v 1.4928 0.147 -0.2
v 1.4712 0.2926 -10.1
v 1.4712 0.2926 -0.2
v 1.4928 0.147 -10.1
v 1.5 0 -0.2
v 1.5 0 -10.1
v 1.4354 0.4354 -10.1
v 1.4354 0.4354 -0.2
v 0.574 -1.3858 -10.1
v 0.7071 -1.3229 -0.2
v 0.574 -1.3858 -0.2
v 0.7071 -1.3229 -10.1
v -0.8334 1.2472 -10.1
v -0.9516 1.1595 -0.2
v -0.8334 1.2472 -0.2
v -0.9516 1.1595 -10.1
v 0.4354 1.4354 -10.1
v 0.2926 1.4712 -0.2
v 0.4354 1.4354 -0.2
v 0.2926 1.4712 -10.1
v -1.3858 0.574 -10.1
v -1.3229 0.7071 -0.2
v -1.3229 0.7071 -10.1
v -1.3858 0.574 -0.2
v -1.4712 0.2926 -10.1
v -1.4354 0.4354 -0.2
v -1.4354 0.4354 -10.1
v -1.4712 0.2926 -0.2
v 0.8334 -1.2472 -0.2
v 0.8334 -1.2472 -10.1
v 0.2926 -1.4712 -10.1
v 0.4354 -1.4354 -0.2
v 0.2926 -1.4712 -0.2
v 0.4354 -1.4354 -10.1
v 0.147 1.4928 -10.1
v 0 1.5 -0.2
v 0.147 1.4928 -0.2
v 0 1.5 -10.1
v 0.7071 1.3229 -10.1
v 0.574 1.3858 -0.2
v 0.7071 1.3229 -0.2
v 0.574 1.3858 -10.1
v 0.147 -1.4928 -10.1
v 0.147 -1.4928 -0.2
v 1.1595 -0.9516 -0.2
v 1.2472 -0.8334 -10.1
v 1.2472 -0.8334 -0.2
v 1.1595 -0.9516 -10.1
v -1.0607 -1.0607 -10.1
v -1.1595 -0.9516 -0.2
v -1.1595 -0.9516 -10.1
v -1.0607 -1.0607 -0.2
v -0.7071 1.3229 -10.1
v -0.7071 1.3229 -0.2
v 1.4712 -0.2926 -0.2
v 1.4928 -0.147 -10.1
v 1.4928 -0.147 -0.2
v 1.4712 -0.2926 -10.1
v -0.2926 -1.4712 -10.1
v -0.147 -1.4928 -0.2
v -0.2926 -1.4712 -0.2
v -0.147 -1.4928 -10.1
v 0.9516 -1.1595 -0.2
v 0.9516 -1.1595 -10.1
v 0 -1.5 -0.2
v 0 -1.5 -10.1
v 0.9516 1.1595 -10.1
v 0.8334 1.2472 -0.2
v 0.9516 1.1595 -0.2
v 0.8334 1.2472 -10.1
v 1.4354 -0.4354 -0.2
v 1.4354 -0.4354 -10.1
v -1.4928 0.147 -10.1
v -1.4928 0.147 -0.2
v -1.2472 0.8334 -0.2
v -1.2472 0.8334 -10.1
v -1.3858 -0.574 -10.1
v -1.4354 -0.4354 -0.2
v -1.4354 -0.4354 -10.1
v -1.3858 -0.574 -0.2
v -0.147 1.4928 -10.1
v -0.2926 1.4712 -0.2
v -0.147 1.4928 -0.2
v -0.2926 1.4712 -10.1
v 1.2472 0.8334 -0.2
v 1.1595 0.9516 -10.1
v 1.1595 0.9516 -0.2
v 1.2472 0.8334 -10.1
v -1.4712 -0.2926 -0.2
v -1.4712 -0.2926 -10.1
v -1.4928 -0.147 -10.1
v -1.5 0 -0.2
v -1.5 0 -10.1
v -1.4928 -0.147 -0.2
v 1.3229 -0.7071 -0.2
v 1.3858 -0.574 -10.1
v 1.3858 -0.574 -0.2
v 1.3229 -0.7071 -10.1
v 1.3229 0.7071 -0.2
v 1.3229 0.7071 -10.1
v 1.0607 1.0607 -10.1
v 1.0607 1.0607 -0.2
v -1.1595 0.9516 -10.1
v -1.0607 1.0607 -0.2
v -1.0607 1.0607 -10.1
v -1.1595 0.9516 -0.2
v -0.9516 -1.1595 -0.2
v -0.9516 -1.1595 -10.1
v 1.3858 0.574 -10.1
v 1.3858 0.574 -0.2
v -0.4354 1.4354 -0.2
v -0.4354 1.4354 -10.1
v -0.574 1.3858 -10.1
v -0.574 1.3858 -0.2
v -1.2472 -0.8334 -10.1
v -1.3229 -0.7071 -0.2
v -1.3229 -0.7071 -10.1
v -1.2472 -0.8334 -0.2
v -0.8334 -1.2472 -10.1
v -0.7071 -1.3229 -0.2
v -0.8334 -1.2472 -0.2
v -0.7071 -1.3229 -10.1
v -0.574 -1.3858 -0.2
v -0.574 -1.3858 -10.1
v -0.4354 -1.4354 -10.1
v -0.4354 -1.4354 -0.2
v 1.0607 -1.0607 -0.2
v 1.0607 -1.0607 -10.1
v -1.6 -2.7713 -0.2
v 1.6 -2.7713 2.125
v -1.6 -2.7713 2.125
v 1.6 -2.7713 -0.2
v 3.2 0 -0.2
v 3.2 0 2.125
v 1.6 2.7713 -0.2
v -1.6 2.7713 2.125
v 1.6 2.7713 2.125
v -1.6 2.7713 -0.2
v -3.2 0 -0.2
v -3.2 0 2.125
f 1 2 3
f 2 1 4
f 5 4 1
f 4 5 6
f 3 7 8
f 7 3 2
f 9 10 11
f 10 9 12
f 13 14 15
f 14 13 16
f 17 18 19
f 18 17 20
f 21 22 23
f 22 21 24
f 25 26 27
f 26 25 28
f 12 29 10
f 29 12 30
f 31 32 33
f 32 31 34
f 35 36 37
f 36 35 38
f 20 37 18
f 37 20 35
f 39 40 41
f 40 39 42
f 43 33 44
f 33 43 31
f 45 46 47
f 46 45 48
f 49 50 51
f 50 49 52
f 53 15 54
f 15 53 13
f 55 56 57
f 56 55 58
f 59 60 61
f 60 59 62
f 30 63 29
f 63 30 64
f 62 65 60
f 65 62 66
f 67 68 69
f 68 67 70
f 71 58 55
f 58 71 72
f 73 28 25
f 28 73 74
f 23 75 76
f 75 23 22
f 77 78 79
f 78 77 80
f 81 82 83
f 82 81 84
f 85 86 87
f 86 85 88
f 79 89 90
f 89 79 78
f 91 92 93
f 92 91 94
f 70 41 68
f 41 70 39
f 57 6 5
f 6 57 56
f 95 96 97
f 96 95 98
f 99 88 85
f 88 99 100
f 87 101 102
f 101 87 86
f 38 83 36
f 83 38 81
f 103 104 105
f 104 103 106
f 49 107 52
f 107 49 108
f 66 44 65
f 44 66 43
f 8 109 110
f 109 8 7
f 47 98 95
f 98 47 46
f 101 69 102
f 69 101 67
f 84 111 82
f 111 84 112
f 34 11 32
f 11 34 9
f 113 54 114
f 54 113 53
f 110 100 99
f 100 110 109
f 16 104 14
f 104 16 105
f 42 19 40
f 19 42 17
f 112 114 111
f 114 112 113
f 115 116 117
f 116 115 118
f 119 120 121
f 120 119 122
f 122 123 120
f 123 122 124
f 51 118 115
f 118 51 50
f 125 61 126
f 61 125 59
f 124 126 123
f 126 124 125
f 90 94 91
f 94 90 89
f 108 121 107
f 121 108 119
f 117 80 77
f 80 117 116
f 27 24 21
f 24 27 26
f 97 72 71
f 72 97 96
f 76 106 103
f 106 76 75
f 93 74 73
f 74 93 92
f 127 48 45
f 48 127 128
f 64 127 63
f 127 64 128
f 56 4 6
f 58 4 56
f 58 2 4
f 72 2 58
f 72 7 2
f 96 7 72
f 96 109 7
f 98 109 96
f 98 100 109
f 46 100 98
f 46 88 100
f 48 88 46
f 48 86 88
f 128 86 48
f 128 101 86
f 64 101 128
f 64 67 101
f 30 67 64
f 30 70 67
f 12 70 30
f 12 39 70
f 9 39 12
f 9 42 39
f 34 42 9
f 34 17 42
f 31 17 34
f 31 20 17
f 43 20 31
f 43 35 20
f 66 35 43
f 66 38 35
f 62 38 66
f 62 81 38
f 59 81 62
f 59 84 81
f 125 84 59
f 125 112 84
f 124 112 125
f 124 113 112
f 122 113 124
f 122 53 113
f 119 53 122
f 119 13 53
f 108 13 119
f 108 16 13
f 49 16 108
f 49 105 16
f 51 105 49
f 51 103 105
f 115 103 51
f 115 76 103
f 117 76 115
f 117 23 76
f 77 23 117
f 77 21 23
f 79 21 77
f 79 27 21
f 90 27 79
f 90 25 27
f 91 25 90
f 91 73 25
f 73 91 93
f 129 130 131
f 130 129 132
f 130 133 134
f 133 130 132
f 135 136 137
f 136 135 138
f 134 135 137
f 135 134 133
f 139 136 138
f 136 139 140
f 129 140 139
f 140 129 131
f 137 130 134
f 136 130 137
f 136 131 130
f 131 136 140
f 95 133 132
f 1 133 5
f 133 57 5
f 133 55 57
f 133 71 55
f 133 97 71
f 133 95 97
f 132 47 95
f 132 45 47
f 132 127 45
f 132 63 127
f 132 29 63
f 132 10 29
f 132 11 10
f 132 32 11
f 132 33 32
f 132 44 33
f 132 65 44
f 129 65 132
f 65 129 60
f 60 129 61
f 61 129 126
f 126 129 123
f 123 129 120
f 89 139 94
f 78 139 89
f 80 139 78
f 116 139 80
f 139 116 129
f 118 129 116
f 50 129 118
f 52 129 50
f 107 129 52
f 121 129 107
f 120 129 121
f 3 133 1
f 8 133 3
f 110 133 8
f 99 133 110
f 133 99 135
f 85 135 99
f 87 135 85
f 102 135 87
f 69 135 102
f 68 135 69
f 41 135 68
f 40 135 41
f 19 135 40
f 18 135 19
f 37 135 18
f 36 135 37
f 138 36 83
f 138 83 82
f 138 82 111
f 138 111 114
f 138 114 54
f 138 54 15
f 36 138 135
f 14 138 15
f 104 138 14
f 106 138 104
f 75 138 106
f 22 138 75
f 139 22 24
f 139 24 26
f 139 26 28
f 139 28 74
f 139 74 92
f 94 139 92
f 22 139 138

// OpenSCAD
// Simple hex head screw (single connected solid)
// Requested: 3.0mm shank diameter, 6.4mm head diameter, head height 2.125mm, 10mm long (under-head length)

shaft_diameter_mm = 3.0;
overall_length_mm = 10.0;     // under-head length
head_diameter_mm  = 6.4;      // across corners for $fn=6 cylinder
head_height_mm    = 2.125;

connection_overlap_mm = 0.2;  // small overlap to guarantee manifold union

$fn = 64;

module hex_head_screw() {
    union() {
        // Shaft: from z=0 (under head) down to z=-overall_length_mm
        translate([0, 0, -overall_length_mm/2])
            cylinder(h = overall_length_mm + connection_overlap_mm,
                     r = shaft_diameter_mm/2,
                     center = true);

        // Hex head: sits on top of shaft, from z=0 up to z=head_height_mm
        translate([0, 0, head_height_mm/2 - connection_overlap_mm/2])
            cylinder(h = head_height_mm + connection_overlap_mm,
                     r = head_diameter_mm/2,
                     $fn = 6,
                     center = true);
    }
}

hex_head_screw();
